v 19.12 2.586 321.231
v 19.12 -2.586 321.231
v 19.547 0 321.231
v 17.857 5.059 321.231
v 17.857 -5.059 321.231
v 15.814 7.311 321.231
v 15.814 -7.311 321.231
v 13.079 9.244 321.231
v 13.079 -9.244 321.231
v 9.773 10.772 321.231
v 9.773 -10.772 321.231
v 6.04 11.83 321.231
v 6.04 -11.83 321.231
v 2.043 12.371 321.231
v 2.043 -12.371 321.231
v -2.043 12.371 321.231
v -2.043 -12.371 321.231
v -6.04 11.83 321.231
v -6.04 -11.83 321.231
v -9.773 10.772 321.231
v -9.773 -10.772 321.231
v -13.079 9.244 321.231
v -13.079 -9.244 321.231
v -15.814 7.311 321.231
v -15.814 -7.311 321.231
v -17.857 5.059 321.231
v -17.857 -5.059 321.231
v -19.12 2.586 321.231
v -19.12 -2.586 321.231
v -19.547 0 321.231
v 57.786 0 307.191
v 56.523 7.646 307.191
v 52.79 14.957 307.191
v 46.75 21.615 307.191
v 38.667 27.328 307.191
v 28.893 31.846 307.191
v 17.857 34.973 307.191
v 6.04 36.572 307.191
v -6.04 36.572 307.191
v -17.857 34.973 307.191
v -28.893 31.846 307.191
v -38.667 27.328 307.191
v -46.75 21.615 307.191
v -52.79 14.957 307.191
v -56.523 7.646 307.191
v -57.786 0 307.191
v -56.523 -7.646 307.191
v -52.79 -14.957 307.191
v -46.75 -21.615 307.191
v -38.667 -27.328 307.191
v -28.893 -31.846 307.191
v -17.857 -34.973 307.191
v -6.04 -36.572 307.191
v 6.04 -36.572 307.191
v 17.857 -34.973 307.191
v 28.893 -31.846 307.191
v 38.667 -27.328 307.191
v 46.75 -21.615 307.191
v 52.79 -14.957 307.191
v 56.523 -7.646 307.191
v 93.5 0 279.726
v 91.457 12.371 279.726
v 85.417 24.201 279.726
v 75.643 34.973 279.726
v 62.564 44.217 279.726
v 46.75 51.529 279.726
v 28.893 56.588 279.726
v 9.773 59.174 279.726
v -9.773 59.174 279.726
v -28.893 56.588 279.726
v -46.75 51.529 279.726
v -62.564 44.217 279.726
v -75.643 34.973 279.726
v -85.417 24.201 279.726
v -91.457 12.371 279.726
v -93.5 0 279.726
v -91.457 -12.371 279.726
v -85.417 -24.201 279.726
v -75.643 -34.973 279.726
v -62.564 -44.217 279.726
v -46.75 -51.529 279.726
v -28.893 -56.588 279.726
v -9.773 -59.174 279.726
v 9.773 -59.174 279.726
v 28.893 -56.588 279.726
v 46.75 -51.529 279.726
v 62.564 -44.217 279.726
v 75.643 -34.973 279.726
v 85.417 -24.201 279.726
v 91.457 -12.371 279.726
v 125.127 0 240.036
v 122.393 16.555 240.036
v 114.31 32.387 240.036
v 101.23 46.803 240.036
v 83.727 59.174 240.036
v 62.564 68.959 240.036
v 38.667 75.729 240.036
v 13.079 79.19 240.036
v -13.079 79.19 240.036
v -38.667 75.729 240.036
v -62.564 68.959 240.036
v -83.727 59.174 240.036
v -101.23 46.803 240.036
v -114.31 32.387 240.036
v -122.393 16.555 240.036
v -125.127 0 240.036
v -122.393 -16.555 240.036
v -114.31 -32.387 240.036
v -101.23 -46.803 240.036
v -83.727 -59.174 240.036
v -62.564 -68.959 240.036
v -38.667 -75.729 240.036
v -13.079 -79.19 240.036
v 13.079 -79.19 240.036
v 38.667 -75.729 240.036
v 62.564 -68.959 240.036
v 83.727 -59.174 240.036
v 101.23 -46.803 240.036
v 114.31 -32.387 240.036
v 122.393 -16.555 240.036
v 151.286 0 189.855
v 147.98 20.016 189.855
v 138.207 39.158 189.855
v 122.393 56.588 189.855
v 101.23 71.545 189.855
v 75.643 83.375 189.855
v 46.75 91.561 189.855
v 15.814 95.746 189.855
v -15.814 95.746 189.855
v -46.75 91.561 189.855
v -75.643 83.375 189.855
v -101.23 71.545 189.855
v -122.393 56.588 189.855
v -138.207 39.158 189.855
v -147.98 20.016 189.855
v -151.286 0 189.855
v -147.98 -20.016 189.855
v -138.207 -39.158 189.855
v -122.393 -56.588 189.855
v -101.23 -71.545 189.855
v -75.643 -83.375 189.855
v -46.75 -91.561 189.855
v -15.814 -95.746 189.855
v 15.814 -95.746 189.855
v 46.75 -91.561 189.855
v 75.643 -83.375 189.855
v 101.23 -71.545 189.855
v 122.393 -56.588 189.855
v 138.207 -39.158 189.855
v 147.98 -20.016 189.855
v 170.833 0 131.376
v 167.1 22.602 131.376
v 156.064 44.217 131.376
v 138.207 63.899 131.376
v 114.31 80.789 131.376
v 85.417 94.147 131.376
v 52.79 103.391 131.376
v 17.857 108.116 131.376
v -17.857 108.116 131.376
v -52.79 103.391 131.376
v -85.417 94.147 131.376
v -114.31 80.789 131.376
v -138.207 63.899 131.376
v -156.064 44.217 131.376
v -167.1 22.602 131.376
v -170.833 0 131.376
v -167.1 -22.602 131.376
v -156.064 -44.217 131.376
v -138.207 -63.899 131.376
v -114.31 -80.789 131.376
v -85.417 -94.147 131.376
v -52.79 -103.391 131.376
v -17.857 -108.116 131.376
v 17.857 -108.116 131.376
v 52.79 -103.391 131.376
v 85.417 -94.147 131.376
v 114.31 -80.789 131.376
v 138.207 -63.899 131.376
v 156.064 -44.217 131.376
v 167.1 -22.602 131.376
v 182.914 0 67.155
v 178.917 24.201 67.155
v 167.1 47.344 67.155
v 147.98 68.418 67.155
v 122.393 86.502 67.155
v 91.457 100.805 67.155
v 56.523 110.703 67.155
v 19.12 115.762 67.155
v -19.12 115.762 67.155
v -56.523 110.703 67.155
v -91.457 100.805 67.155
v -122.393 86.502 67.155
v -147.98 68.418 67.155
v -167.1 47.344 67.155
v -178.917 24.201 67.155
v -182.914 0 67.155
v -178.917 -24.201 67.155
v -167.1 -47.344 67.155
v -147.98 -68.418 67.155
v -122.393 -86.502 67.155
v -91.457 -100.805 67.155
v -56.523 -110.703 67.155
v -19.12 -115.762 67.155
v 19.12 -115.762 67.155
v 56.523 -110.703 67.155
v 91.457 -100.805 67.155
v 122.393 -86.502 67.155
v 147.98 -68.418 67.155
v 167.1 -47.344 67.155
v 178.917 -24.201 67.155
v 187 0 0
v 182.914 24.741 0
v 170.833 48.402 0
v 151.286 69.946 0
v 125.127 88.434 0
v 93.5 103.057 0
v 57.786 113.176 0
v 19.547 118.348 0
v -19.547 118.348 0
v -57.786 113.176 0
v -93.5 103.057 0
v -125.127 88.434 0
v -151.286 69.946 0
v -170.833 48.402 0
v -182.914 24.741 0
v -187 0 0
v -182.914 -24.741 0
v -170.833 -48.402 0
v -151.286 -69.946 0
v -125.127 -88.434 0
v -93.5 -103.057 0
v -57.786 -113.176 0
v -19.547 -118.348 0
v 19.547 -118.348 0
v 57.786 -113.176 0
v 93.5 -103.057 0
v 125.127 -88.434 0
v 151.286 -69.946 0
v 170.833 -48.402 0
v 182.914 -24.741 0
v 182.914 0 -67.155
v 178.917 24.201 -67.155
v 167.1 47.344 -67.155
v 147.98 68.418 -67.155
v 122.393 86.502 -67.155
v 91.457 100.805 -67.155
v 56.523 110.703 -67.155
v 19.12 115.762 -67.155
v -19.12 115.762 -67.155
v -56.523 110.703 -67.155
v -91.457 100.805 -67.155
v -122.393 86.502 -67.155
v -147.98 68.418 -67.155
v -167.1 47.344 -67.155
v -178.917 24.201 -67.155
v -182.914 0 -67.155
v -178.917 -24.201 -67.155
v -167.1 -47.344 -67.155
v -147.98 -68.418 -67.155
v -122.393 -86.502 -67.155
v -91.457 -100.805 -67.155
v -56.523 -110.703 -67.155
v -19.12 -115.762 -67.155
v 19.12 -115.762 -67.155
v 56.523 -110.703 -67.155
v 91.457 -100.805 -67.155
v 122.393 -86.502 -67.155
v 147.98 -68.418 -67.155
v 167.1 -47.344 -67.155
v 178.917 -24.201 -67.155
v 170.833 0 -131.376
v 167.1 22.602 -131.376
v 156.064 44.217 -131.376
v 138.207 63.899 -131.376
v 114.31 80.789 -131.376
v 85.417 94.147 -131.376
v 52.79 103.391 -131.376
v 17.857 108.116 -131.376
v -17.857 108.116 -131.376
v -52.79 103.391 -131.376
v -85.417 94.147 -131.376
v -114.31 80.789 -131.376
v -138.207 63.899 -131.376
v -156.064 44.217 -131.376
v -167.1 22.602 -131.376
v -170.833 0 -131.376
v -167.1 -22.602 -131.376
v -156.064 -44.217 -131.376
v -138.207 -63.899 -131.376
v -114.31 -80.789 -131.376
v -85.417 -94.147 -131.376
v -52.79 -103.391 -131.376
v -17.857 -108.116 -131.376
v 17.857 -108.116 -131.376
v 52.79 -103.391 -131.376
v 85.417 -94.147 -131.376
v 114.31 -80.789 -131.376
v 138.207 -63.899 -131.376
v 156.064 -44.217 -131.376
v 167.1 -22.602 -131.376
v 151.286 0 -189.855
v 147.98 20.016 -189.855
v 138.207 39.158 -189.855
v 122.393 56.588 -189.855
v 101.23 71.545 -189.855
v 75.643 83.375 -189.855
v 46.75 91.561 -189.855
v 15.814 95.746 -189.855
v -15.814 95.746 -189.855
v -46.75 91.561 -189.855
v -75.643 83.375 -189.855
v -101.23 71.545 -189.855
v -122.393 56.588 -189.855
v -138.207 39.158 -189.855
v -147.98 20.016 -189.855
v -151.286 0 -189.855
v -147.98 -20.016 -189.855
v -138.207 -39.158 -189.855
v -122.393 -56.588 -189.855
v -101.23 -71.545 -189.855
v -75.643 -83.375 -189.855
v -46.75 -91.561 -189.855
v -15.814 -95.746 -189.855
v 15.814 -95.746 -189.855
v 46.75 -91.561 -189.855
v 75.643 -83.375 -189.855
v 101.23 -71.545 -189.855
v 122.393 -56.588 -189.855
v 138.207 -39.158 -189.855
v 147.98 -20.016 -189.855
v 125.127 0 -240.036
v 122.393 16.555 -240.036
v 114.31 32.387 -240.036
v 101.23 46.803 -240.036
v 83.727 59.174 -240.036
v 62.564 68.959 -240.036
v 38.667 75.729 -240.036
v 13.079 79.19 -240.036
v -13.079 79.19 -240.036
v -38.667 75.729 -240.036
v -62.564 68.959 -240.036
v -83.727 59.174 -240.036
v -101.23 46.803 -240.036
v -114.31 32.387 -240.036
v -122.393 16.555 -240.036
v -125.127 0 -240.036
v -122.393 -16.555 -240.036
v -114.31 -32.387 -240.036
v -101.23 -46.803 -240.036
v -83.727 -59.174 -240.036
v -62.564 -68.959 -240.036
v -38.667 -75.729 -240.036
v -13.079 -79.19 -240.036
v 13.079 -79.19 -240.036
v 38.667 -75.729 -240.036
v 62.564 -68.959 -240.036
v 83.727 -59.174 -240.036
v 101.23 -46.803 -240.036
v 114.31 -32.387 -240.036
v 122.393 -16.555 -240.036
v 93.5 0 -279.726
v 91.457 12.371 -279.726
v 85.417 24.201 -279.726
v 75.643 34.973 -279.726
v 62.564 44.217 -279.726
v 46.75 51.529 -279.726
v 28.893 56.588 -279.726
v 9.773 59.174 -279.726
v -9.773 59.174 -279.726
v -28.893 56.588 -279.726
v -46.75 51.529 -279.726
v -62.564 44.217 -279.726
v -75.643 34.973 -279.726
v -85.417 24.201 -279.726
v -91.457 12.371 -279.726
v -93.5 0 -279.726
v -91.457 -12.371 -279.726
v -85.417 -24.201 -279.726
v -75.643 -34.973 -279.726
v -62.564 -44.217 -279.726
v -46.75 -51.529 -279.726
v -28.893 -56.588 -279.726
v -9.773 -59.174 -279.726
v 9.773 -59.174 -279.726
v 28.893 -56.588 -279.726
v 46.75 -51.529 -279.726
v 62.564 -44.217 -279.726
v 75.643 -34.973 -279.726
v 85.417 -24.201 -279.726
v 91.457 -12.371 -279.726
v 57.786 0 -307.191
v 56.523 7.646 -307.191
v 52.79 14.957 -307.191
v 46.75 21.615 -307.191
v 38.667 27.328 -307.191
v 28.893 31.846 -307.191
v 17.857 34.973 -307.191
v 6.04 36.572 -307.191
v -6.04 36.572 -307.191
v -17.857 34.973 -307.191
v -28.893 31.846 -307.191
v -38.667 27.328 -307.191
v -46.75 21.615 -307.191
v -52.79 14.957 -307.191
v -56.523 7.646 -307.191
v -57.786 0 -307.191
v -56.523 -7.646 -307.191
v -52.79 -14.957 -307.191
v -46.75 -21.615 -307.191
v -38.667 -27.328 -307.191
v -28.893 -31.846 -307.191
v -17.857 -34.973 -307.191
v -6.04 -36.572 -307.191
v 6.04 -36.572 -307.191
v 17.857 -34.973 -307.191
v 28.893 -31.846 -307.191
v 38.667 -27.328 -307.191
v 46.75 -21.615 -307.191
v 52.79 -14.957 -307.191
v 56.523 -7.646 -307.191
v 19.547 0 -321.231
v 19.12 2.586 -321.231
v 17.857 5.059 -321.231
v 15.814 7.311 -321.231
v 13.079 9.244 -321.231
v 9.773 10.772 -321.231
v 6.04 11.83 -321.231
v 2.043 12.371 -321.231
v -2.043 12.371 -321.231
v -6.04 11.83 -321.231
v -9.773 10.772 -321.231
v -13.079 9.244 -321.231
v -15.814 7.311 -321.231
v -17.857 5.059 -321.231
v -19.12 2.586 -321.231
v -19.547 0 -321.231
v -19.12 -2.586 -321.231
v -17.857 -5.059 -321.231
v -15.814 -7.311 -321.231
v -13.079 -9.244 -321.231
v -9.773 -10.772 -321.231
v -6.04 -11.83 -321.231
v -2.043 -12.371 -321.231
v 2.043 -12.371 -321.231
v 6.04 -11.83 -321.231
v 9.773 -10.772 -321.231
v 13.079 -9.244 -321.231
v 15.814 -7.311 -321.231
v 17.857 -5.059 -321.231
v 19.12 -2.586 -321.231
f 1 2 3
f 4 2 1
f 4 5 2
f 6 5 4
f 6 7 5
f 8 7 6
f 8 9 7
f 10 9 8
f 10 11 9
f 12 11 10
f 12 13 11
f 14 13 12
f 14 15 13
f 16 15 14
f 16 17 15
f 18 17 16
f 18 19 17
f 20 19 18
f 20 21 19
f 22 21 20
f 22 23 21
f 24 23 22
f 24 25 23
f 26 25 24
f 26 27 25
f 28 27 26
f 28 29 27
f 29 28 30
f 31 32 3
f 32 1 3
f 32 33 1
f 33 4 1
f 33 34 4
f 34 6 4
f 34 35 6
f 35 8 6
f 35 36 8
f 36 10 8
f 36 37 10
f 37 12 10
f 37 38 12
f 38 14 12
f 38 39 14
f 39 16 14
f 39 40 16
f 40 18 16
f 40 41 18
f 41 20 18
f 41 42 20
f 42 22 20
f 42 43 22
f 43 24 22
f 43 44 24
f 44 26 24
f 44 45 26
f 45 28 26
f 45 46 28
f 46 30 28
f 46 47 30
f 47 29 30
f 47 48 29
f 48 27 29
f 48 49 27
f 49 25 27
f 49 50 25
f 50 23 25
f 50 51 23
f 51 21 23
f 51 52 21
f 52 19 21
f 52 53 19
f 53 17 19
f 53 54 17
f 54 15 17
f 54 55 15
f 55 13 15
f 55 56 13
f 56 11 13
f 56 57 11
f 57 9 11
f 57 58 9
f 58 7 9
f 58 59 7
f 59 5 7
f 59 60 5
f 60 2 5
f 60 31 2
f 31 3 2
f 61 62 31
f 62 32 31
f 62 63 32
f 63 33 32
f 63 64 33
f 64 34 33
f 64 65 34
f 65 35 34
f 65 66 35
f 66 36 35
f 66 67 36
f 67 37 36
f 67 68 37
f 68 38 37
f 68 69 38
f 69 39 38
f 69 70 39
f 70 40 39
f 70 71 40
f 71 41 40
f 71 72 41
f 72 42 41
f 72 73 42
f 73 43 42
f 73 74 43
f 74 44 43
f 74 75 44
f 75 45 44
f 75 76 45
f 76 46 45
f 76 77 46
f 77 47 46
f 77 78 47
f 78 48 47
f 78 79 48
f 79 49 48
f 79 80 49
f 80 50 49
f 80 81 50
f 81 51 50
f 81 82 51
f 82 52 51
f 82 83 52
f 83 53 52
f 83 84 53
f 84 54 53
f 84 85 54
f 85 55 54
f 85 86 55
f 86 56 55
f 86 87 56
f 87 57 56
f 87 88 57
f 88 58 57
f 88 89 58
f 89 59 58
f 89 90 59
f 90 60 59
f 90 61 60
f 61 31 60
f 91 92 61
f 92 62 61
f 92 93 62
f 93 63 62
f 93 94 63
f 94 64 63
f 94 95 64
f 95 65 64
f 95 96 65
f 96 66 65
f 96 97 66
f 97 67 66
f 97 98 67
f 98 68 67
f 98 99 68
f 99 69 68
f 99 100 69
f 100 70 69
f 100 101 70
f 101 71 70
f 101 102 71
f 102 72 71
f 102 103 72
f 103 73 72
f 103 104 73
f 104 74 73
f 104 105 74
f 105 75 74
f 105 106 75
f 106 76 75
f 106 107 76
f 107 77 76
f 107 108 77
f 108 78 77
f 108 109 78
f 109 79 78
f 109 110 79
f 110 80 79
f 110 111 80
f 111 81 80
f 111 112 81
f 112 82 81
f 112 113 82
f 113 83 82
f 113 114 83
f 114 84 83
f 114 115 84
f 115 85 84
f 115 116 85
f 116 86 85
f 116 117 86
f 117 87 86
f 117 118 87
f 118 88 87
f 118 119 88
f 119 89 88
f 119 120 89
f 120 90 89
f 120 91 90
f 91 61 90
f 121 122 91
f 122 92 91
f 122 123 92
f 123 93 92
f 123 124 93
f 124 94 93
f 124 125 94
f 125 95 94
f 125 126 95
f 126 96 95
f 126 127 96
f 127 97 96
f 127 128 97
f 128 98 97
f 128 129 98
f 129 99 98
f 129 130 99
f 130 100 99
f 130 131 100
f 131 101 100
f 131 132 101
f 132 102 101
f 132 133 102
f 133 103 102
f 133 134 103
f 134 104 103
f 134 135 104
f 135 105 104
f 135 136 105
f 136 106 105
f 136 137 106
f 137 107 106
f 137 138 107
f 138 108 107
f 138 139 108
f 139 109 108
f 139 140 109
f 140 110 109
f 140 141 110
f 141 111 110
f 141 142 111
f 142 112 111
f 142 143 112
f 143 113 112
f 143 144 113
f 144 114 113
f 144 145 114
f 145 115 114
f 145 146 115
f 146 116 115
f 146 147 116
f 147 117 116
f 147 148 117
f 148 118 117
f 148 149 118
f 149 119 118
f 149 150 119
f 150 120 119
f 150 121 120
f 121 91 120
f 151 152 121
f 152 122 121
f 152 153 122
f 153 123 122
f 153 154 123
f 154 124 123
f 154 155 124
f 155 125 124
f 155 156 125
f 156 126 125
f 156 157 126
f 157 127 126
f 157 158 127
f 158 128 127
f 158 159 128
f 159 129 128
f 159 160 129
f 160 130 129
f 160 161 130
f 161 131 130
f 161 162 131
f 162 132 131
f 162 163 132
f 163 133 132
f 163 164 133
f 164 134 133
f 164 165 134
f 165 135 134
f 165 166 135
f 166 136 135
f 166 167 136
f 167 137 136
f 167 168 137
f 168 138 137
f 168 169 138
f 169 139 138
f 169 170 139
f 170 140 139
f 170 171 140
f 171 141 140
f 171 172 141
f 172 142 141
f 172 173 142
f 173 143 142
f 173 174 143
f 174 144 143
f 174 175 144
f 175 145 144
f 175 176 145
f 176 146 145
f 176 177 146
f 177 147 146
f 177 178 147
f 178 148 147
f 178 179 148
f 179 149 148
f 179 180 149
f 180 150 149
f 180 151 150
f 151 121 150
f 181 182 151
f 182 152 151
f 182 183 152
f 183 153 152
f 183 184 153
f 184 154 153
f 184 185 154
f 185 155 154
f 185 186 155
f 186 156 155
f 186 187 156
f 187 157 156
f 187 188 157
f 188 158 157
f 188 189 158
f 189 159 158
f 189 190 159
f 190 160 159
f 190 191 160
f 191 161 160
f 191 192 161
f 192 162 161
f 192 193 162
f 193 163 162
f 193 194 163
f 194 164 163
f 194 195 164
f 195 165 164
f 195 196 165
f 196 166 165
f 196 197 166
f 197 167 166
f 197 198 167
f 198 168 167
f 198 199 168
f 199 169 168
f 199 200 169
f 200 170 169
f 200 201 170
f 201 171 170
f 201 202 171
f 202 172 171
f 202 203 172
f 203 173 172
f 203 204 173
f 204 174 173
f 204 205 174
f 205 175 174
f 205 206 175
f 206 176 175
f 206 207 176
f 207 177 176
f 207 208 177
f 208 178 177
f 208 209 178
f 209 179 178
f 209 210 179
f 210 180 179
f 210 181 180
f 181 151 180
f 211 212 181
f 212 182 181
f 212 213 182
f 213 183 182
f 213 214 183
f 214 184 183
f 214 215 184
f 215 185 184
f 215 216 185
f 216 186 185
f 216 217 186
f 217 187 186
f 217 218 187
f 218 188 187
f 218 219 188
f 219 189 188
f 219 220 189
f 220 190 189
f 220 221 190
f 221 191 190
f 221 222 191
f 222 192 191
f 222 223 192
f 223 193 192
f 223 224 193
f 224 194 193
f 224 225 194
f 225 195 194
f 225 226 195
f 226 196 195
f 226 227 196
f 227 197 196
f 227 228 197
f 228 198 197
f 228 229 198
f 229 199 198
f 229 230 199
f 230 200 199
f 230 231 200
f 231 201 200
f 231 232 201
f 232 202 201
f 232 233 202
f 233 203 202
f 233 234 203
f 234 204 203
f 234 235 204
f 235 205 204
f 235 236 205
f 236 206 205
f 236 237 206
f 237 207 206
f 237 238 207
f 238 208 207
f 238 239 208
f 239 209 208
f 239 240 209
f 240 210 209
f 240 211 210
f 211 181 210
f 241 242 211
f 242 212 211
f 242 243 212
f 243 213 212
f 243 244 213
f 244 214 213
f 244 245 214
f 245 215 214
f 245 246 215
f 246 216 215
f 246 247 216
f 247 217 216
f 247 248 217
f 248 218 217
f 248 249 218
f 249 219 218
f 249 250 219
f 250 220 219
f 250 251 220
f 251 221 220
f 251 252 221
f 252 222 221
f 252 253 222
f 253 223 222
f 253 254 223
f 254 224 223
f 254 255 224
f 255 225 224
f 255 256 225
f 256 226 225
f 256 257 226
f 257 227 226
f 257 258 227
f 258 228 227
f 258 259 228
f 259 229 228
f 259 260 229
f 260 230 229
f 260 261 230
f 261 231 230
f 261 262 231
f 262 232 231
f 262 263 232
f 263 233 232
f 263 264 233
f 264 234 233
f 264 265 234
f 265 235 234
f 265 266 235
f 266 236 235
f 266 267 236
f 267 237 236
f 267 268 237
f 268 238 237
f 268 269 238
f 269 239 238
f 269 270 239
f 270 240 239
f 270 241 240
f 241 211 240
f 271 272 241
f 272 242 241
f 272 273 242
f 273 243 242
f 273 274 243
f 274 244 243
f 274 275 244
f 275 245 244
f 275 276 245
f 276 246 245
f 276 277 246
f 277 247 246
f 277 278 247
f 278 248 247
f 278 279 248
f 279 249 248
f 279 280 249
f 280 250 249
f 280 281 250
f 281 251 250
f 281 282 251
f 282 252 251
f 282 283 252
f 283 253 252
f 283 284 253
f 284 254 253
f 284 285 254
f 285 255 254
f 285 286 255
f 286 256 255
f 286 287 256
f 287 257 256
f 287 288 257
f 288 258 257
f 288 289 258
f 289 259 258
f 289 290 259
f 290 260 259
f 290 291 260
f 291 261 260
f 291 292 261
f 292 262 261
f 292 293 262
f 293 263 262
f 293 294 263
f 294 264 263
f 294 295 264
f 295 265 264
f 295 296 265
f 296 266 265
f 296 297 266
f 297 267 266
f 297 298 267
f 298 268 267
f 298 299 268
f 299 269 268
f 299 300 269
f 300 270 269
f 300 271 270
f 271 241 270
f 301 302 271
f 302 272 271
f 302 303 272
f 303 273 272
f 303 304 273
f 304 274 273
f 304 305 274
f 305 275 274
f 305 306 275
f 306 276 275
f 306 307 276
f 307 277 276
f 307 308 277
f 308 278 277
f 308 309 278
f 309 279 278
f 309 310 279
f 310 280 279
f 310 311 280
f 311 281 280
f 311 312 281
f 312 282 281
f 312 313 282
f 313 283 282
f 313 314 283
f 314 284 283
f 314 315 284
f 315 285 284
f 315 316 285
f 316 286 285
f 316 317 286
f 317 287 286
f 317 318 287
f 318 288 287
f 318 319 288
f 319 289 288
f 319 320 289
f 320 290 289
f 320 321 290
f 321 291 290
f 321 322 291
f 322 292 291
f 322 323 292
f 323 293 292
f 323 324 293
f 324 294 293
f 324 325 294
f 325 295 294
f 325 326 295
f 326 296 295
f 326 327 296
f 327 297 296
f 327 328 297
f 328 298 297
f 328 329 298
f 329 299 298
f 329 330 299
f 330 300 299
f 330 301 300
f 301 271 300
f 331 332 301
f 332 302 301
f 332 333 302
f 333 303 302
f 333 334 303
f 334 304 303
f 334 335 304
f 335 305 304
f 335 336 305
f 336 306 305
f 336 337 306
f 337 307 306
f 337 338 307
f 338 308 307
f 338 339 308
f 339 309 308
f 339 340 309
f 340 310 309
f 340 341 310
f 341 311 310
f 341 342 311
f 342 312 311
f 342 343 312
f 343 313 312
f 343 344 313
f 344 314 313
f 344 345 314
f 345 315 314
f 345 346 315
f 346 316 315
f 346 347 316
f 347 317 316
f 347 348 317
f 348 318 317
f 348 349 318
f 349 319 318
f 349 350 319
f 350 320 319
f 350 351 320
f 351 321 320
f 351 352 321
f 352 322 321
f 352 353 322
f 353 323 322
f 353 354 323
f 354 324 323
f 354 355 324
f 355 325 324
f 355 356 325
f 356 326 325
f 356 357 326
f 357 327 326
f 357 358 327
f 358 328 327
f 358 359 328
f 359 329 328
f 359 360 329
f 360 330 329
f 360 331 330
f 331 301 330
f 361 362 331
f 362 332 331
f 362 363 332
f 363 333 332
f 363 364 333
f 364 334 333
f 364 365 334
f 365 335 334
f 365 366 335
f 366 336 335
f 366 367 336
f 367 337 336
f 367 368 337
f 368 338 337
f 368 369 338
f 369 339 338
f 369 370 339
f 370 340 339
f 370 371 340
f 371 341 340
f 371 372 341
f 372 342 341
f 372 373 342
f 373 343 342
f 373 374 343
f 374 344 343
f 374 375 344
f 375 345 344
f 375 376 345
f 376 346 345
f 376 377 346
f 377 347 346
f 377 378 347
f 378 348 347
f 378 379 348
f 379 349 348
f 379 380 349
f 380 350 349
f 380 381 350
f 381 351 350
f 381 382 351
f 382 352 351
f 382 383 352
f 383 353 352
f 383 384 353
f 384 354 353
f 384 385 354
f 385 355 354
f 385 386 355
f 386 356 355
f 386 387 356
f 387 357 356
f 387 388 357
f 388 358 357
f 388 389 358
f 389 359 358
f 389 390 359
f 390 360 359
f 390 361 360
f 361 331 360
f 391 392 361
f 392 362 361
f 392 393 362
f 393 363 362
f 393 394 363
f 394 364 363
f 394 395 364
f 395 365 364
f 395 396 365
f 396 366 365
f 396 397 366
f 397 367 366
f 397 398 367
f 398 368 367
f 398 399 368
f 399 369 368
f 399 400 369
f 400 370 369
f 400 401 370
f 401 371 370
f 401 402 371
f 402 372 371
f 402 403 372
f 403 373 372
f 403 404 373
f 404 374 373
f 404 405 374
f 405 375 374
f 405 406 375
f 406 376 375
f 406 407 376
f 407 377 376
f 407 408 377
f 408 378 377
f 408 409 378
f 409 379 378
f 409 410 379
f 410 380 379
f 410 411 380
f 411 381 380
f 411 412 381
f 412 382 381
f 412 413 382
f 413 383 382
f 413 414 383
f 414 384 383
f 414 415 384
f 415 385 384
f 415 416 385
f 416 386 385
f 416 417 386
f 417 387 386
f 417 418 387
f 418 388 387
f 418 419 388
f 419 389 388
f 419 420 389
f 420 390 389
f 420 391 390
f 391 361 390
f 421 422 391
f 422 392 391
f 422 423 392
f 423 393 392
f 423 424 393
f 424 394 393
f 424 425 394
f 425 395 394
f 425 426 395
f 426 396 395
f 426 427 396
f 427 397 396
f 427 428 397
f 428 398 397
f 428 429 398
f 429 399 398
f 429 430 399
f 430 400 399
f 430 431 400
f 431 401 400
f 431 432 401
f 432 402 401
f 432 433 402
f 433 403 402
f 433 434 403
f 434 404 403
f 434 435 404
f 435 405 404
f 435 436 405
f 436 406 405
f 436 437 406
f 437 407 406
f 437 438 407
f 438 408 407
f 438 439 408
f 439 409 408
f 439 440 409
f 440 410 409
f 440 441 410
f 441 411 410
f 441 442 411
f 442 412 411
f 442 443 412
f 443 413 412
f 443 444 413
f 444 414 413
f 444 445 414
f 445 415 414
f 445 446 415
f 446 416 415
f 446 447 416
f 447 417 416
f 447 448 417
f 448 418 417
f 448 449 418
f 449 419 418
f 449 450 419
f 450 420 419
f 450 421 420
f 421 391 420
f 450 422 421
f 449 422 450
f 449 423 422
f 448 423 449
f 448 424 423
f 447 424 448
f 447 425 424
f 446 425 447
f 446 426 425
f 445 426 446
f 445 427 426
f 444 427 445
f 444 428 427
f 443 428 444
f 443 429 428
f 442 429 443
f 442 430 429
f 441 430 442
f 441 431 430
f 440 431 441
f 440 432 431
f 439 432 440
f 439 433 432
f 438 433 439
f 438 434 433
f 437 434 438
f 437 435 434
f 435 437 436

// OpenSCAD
// Generated by SolidPython 1.0.1 on 2020-07-29 00:46:49


scale(v = [11, 7, 19]) {
	sphere(r = 17);
}
/***********************************************
*********      SolidPython code:      **********
************************************************
 
# import packages: SolidPython
from solid import *
from solid.utils import *
from itertools import chain, combinations, permutations


class Resize:

    def __init__(self, scad_file):
        self.scad_file = scad_file
        #self.scad_file = import_scad(scad_file)
        # cone/cylinder param:
        self.r1 = 0
        self.r2 = 0
        self.h = 0
        # rectangular prism param:
        self.w = 0
        self.l = 0
        # ellipse param:
        self.r = 0

    # import OpenScad code (file name corresponds to shape)


    # classify shape + parameters
    def assign(self, param1, param2, param3):
        if self.scad_file == 'cone.scad':
            self.r1 = param1
            self.r2 = param2
            self.h = param3
        elif self.scad_file == 'cylinder.scad':
            self.r1 = param1
            self.r2 = param2
            self.h = param3
        elif self.scad_file == 'rectangularPrism.scad':
            self.h = param1
            self.l = param2
            self.w = param3
        else:
            self.r = param1
            self.h = param2

    # resize parameters
    def iterate(self):
        x = range(3, 20, 2)
        i = 1
        if self.scad_file == 'cone.scad':
            tempList = list(permutations(x, 2))
            for temp in tempList:
                param1 = temp[0]
                param2 = temp[1]
                filepath = 'produced_scad_files/' + 'cone' + str(param1) + '_' + str(param2) + '_' + '.scad'
                scad_render_to_file(cylinder(h=param1, r1=param2, r2=0), filepath)

        elif self.scad_file == 'cylinder.scad':
            tempList = list(permutations(x, 3))
            for temp in tempList:
                param1 = temp[0]
                param2 = temp[1]
                filepath = 'produced_scad_files/' + 'cylinder' + str(param1) + '_' + str(param2) + '_' + '.scad'
                scad_render_to_file(cylinder(h=param1, r1=param2, r2=param2), filepath)

        elif self.scad_file == 'rectangularPrism.scad':
            tempList = list(permutations(x, 3))
            for temp in tempList:
                param1 = temp[0]
                param2 = temp[1]
                param3 = temp[2]
                filepath = 'produced_scad_files/' + 'rectangularPrism' + str(param1) + '_' + str(param2) + '_' + str(
                    param3) + '.scad'
                scad_render_to_file(cube(size=(param1, param2, param3)), filepath)

        elif self.scad_file == 'ellipse.scad':
            tempList = list(permutations(x, 4))
            for temp in tempList:
                param1 = temp[0]
                param2 = temp[1]
                param3 = temp[2]
                param4 = temp[3]
                filepath = 'produced_scad_files/' + 'ellipse' + str(param1) + '_' + str(param2) + '_' + str(param3) + '_' + str(param4) + '.scad'
                scad_render_to_file(scale([param1, param2, param3])(sphere(r=param4)), filepath)

    def render_to_scadfile(self):
        scad_render_to_file(scad, 'example.scad') 
 
************************************************/
